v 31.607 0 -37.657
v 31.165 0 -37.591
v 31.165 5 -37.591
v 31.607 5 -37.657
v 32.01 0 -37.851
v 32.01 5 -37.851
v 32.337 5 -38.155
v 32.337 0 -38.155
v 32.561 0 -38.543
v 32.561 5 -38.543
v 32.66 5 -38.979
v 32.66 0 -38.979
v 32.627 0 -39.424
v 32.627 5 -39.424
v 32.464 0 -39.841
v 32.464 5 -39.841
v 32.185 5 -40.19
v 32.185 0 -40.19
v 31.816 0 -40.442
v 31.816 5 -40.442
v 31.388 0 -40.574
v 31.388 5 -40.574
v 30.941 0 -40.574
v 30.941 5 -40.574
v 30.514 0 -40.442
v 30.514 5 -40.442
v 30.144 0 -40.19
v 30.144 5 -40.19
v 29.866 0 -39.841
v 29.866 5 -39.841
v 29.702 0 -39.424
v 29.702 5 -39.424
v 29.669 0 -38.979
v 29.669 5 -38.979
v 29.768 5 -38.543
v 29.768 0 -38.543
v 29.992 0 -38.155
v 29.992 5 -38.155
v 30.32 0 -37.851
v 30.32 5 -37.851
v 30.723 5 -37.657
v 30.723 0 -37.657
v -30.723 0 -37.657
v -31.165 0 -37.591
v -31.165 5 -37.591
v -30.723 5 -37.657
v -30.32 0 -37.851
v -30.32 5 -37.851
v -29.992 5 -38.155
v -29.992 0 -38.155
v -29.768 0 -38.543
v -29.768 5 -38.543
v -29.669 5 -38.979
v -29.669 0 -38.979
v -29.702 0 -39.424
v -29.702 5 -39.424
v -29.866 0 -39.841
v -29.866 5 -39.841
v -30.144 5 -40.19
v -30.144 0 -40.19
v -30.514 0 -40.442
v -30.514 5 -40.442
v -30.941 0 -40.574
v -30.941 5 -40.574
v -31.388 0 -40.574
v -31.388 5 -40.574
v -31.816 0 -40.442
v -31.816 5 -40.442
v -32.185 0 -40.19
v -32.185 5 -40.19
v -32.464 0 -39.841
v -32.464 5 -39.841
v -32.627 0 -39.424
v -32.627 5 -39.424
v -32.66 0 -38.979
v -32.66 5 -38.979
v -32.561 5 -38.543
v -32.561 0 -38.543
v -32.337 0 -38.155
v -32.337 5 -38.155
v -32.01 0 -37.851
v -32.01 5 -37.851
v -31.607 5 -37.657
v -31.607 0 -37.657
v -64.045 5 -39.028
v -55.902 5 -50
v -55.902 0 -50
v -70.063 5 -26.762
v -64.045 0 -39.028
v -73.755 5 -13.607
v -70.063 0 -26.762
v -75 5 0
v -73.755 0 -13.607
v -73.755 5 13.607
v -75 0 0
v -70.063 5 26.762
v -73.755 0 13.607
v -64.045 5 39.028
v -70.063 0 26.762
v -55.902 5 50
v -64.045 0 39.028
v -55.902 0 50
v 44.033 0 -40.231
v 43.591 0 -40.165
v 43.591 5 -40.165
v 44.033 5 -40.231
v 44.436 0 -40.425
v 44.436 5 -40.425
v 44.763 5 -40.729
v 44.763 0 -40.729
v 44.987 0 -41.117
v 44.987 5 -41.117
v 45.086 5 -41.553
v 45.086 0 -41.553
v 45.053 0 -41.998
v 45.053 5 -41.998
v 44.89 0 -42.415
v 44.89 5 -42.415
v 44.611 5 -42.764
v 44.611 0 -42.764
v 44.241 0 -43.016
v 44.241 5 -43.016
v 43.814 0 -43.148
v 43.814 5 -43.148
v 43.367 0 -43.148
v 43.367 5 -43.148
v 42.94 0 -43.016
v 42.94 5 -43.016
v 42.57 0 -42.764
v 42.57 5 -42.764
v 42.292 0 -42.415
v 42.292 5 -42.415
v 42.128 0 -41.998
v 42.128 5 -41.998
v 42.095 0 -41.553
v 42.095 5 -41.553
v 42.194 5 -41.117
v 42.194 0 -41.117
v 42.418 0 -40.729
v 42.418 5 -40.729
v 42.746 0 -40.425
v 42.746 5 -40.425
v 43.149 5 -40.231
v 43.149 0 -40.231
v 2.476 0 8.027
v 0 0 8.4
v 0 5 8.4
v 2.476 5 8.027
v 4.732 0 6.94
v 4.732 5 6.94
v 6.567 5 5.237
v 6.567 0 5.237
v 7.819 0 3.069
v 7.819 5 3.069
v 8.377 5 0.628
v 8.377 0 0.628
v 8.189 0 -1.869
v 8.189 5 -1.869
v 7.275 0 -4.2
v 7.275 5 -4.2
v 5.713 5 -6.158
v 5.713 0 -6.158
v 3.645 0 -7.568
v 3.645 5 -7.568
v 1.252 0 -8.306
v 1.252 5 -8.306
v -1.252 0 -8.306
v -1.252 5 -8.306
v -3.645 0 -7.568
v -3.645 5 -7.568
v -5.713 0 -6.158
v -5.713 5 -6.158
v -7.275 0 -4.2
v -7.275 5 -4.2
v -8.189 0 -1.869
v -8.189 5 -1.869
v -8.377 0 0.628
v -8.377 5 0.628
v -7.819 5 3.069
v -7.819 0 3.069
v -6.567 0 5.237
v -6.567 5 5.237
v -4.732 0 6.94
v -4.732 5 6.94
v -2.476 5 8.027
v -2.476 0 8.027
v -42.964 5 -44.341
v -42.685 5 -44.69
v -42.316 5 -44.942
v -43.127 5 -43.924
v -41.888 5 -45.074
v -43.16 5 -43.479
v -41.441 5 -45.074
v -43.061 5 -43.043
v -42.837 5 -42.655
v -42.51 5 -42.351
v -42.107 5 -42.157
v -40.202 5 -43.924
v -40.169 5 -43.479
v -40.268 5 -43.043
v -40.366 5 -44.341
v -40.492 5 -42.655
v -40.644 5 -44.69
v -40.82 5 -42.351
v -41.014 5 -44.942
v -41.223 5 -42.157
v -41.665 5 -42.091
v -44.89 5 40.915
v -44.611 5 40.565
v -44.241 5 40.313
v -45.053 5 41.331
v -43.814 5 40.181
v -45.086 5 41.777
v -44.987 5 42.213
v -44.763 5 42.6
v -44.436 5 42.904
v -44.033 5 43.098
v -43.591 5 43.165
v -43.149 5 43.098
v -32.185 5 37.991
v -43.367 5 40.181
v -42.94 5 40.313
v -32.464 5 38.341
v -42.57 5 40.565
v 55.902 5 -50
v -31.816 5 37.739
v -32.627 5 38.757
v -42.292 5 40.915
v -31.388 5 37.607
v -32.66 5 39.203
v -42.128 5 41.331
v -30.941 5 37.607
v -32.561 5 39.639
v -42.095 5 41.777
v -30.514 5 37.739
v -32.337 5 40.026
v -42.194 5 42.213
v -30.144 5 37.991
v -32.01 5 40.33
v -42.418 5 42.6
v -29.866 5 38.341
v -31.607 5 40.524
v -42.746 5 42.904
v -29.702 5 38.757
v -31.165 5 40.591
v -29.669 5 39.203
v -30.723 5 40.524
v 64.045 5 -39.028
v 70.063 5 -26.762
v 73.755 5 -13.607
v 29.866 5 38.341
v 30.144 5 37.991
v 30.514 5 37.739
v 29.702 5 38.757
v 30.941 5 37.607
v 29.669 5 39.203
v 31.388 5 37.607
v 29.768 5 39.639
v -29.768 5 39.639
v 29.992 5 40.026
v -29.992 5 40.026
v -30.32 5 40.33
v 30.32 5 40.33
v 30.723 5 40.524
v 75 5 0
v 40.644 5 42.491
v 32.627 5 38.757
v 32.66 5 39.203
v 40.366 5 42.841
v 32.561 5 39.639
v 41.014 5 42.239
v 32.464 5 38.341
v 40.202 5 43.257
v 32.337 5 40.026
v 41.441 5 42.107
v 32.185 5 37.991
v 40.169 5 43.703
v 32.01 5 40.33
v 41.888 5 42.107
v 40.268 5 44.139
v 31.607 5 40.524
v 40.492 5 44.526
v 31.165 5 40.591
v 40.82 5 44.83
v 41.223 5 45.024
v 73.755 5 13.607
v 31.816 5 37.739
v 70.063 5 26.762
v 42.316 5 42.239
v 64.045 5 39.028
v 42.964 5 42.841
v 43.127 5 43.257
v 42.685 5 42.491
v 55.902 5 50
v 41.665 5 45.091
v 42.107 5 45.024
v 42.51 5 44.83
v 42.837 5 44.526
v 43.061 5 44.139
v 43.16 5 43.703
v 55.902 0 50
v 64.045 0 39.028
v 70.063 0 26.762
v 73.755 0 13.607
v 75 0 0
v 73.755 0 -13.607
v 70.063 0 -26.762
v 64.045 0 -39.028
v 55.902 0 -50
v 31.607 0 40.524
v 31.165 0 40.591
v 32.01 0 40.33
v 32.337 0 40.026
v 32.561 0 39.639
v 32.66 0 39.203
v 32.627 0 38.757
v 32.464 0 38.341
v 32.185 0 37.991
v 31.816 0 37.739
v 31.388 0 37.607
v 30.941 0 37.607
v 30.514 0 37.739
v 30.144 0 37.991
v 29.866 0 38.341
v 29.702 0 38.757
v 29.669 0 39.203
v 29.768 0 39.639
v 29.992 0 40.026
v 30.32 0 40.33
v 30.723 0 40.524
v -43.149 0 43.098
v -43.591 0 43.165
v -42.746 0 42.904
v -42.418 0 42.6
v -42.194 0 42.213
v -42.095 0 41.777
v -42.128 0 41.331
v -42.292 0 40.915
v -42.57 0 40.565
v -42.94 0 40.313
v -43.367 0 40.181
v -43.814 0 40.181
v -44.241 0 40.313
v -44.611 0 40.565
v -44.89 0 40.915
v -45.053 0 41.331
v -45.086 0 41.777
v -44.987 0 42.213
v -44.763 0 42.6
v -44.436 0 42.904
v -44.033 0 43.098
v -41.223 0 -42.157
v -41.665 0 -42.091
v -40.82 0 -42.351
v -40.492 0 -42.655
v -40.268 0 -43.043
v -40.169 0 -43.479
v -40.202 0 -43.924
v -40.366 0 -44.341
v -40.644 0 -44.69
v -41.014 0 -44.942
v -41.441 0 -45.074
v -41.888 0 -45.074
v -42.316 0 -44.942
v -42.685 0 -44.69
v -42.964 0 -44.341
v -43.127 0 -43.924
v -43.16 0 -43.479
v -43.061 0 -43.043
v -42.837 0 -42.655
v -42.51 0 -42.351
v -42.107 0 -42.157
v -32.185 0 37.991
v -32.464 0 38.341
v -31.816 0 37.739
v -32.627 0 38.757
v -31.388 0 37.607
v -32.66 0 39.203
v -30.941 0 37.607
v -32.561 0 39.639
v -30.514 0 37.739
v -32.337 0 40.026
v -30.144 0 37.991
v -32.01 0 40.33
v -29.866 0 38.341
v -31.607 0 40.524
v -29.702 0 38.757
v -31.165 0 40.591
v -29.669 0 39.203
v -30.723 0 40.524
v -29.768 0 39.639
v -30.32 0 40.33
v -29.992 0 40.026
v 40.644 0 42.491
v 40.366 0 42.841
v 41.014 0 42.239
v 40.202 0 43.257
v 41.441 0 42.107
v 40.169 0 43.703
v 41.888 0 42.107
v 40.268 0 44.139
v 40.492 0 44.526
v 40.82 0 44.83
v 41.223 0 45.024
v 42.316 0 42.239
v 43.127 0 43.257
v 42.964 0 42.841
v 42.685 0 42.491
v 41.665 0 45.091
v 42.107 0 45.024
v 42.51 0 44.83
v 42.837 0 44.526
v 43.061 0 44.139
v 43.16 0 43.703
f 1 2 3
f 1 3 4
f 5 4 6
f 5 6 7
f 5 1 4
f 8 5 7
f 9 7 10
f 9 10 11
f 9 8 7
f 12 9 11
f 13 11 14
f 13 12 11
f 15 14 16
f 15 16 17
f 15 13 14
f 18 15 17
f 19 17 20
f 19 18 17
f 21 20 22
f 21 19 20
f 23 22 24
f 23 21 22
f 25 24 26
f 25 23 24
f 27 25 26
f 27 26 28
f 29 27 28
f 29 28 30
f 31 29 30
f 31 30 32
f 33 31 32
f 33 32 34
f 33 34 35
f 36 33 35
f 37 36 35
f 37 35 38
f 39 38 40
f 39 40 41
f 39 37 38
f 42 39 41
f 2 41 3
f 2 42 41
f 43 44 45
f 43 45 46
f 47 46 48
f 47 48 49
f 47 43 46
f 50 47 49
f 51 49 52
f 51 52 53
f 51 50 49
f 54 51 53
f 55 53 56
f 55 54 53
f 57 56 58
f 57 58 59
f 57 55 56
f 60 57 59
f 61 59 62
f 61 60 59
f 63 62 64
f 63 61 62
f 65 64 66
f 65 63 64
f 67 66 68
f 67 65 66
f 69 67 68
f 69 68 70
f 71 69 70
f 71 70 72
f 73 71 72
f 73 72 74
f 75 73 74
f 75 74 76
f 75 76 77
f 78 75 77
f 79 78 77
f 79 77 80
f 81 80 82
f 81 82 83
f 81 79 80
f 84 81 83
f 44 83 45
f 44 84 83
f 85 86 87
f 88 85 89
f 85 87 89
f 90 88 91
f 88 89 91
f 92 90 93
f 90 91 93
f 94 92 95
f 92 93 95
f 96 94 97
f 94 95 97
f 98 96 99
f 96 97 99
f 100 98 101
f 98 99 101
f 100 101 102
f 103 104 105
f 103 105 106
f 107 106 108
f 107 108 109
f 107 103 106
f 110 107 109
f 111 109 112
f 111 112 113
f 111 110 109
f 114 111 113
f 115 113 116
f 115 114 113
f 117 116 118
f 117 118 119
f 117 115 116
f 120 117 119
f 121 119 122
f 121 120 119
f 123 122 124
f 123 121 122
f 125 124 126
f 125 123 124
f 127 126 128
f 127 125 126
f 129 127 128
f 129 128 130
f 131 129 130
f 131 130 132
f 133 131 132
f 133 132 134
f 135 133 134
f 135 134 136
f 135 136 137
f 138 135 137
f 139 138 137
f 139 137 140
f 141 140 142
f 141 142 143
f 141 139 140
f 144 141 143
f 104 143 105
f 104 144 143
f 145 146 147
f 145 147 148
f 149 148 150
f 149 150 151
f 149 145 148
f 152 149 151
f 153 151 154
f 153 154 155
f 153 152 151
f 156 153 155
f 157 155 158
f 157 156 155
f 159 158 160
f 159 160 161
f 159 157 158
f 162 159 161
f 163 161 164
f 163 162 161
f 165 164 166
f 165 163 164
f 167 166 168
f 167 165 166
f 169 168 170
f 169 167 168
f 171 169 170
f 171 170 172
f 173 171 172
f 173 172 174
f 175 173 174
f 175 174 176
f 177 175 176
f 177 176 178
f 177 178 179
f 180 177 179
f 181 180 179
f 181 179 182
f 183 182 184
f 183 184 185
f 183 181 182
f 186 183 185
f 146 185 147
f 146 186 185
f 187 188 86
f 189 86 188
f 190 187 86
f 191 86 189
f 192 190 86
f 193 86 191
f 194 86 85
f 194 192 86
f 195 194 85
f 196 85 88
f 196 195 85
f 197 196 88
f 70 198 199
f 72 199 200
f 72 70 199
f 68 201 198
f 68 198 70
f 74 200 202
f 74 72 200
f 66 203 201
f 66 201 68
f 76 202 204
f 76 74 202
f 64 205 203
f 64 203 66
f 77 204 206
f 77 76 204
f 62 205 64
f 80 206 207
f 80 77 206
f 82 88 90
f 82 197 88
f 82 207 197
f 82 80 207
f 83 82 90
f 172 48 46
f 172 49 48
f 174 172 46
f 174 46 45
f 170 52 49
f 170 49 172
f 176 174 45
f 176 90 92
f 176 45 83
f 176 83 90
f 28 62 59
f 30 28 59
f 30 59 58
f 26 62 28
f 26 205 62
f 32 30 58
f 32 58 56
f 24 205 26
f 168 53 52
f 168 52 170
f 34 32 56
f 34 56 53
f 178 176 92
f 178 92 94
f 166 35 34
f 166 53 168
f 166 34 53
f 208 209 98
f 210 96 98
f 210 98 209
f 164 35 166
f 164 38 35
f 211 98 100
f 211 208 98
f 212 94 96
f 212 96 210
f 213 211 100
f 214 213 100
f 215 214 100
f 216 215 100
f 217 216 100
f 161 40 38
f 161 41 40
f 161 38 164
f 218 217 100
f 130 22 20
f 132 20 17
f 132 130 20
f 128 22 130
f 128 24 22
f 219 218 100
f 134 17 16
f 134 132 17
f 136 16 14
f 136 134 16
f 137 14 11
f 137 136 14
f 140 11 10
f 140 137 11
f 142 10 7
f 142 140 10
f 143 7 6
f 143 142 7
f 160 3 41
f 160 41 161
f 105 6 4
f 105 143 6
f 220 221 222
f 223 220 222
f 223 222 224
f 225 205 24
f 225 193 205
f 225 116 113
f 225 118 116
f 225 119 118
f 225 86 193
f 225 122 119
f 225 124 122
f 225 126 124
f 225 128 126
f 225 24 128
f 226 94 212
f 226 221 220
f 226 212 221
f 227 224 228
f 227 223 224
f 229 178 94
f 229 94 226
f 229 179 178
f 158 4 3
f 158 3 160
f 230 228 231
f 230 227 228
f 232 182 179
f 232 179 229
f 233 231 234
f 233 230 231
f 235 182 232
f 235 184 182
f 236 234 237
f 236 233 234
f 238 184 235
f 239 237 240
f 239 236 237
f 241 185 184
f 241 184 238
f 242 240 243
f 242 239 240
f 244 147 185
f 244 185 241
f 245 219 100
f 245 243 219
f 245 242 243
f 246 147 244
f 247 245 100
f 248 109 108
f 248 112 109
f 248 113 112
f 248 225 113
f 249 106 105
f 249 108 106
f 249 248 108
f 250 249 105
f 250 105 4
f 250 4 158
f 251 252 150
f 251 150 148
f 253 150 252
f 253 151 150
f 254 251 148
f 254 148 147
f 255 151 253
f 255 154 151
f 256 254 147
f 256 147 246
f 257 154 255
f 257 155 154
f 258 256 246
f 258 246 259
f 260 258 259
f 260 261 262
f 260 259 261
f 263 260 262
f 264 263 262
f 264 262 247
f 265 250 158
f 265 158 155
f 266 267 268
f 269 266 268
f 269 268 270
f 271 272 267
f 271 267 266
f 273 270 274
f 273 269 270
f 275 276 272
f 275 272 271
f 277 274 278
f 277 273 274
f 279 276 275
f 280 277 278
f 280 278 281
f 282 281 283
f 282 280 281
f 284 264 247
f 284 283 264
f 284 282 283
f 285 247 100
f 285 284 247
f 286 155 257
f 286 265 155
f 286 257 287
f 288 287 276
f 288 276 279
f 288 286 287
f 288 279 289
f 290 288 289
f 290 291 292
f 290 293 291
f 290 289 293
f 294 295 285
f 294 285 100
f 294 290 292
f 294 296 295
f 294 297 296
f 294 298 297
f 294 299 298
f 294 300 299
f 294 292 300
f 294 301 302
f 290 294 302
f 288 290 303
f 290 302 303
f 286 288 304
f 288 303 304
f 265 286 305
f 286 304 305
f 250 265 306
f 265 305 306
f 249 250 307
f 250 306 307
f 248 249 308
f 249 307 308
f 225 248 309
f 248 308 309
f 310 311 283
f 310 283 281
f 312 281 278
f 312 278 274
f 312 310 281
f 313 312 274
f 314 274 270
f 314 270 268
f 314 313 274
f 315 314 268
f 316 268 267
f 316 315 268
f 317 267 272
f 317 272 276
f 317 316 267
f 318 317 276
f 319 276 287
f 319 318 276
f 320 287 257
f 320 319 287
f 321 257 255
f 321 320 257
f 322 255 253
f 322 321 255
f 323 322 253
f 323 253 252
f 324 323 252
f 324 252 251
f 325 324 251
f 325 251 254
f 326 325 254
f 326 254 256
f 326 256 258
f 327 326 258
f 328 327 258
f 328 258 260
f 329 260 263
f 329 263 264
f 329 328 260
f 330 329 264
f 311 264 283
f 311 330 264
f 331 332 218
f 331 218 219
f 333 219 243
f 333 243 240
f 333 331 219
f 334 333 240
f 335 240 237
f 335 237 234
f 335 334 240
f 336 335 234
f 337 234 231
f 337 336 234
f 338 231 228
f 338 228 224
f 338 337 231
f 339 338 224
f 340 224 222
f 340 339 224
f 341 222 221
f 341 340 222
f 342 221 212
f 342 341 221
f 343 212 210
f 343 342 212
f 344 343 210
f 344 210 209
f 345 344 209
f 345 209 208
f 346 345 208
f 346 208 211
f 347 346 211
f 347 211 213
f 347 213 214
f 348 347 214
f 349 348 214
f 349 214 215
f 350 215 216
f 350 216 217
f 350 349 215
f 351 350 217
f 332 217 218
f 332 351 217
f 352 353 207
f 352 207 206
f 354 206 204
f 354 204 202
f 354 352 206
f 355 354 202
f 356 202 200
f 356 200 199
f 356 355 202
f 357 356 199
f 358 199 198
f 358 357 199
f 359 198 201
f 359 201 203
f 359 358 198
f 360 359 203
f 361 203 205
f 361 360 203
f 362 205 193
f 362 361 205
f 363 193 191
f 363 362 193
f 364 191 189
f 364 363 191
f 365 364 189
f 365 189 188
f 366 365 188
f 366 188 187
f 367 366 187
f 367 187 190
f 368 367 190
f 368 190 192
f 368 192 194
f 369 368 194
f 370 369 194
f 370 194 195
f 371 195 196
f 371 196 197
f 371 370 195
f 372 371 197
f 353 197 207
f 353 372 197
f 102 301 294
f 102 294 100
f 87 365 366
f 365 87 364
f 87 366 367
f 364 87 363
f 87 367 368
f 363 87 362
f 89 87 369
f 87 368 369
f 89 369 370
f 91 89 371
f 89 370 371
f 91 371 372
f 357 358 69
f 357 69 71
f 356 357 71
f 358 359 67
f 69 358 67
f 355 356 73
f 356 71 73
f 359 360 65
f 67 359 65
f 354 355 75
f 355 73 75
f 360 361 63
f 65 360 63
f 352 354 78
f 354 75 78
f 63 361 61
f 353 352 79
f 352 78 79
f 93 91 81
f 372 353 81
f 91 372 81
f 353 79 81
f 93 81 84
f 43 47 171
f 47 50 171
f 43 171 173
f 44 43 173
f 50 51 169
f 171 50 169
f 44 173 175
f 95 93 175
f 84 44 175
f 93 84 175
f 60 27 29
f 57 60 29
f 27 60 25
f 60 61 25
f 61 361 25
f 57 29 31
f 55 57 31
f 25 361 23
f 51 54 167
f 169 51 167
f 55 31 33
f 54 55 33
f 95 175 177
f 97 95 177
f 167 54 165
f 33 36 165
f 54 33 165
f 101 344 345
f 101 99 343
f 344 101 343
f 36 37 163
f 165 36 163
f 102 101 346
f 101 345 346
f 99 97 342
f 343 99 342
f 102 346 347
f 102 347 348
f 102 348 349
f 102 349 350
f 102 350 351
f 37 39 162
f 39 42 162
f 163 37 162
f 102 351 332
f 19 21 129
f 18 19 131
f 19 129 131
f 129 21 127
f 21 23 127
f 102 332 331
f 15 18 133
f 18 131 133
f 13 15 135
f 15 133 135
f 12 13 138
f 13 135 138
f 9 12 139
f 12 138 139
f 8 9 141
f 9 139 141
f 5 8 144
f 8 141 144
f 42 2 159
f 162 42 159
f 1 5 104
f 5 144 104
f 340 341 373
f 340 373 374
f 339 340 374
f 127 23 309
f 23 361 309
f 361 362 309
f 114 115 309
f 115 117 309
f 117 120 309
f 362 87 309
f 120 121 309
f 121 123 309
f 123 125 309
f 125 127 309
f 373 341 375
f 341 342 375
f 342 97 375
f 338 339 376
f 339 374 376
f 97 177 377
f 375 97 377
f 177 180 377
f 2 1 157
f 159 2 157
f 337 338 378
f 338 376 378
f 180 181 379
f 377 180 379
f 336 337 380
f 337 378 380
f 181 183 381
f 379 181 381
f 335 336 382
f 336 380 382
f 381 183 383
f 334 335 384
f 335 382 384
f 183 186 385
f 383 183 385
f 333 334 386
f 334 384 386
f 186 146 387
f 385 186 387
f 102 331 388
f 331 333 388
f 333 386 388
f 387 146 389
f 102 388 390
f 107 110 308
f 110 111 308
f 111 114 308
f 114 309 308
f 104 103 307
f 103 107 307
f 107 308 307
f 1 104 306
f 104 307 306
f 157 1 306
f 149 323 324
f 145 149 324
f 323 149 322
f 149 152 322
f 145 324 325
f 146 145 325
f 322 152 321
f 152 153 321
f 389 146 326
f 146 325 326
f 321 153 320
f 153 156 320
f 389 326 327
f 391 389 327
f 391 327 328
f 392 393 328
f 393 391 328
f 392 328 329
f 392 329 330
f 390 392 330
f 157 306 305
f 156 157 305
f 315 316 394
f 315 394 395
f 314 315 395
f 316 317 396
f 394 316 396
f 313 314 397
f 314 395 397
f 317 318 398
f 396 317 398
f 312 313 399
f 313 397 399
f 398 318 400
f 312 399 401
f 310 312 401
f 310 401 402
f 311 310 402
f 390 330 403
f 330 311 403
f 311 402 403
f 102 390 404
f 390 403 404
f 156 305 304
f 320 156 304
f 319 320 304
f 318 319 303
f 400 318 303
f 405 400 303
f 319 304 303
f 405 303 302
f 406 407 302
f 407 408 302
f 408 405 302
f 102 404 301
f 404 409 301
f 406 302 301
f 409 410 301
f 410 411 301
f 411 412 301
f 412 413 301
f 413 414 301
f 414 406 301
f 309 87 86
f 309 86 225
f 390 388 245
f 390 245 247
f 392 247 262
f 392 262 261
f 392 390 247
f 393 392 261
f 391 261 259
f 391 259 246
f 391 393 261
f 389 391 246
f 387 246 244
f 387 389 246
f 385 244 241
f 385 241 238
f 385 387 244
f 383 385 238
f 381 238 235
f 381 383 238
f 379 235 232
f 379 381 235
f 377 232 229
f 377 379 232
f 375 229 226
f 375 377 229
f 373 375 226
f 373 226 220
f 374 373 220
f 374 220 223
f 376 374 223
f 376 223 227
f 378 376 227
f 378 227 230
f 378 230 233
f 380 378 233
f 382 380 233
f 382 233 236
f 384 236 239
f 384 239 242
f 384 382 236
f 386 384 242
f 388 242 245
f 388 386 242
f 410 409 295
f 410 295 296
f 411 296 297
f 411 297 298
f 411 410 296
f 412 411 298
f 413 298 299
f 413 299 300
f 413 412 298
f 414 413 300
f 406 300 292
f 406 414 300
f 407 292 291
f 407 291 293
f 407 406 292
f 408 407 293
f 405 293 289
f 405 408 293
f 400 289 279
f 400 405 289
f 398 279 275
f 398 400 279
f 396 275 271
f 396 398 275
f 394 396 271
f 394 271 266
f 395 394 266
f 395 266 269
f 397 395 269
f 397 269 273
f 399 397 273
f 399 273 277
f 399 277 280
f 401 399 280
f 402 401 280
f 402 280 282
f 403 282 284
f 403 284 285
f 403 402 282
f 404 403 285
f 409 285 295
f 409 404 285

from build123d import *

# Parameters (mm, degrees)
SKETCH1_R           = 75
SKETCH1_R_2         = 1.5
SKETCH1_R_3         = 8.4
BOSS_EXTRUDE1_DEPTH = 5
CUT_EXTRUDE1_START  = -10
CUT_EXTRUDE1_DEPTH  = 10


with BuildPart() as part:
    # Sketch1 → Boss-Extrude1 (new body)
    with BuildSketch(Plane(origin=(0, 0, 0), x_dir=(1, 0, 0), z_dir=(0, 1, 0))):
        with Locations(Location((0, 0, 0), (0, 0, 270))):
            Circle(SKETCH1_R)
        with Locations(Location((-41.664692583, 43.590634223, 0), (0, 0, 270))):
            Circle(SKETCH1_R_2, mode=Mode.SUBTRACT)
        with Locations(Location((43.590634223, 41.664692583, 0), (0, 0, 270))):
            Circle(SKETCH1_R_2, mode=Mode.SUBTRACT)
        with Locations(Location((41.664692583, -43.590634223, 0), (0, 0, 270))):
            Circle(SKETCH1_R_2, mode=Mode.SUBTRACT)
        with Locations(Location((-43.590634223, -41.664692583, 0), (0, 0, 270))):
            Circle(SKETCH1_R_2, mode=Mode.SUBTRACT)
        with Locations(Location((-31.164692583, 39.090634223, 0), (0, 0, 270))):
            Circle(SKETCH1_R_2, mode=Mode.SUBTRACT)
        with Locations(Location((0, 0, 0), (0, 0, 270))):
            Circle(SKETCH1_R_3, mode=Mode.SUBTRACT)
        with Locations(Location((31.164692583, 39.090634223, 0), (0, 0, 270))):
            Circle(SKETCH1_R_2, mode=Mode.SUBTRACT)
        with Locations(Location((31.164692583, -39.090634223, 0), (0, 0, 270))):
            Circle(SKETCH1_R_2, mode=Mode.SUBTRACT)
        with Locations(Location((-31.164692583, -39.090634223, 0), (0, 0, 270))):
            Circle(SKETCH1_R_2, mode=Mode.SUBTRACT)
    extrude(amount=BOSS_EXTRUDE1_DEPTH)

    # Sketch3 → Cut-Extrude1 (cut)
    with BuildSketch(Plane(origin=(0, 5, 0), x_dir=(1, 0, 0), z_dir=(0, 1, 0)).offset(CUT_EXTRUDE1_START)):
        with BuildLine():
            Line((-55.901699437, 50), (0, 50))
            Line((0, 50), (55.901699437, 50))
            ThreePointArc((55.901699437, 50), (0, 75), (-55.901699437, 50))
        make_face()
        with BuildLine():
            Line((55.901699437, -50), (0, -50))
            Line((0, -50), (-55.901699437, -50))
            ThreePointArc((-55.901699437, -50), (0, -75), (55.901699437, -50))
        make_face()
    extrude(amount=CUT_EXTRUDE1_DEPTH, mode=Mode.SUBTRACT)


solid = part.part
